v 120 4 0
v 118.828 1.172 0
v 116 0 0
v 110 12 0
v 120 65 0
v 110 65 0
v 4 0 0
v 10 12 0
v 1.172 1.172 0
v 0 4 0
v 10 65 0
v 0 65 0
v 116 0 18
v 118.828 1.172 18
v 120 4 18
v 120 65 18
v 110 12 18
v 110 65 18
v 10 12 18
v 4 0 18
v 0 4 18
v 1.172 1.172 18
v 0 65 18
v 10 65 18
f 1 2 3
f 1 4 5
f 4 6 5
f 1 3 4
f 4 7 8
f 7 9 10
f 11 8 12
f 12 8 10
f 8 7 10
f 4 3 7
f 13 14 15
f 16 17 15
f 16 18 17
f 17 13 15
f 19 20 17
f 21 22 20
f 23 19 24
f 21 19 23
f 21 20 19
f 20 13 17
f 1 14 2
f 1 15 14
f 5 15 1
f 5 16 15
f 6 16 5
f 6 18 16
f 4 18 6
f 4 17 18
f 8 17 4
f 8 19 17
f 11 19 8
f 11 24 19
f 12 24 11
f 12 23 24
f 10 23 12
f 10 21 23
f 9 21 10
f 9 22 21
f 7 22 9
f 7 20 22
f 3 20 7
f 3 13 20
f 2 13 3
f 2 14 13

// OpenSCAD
$fn = 32;

// ----------------------------------------------------------------------
// Heat sink frame: 120 x 65 mm frame, 10 mm walls
// ----------------------------------------------------------------------

// --- parameters (mm) ---
profile_height = 18;      // extrusion height
profile_points = 12;      // points of the closed outline

profile = [[0, 4], [1.172, 1.172], [4, 0], [116, 0], [118.828, 1.172], [120, 4], [120, 65], [110, 65], [110, 12], [10, 12], [10, 65], [0, 65]];  // single closed polygon, 12 points, counter clockwise

// --- the one profile operation ---
linear_extrude(height = profile_height) polygon(points = profile);
